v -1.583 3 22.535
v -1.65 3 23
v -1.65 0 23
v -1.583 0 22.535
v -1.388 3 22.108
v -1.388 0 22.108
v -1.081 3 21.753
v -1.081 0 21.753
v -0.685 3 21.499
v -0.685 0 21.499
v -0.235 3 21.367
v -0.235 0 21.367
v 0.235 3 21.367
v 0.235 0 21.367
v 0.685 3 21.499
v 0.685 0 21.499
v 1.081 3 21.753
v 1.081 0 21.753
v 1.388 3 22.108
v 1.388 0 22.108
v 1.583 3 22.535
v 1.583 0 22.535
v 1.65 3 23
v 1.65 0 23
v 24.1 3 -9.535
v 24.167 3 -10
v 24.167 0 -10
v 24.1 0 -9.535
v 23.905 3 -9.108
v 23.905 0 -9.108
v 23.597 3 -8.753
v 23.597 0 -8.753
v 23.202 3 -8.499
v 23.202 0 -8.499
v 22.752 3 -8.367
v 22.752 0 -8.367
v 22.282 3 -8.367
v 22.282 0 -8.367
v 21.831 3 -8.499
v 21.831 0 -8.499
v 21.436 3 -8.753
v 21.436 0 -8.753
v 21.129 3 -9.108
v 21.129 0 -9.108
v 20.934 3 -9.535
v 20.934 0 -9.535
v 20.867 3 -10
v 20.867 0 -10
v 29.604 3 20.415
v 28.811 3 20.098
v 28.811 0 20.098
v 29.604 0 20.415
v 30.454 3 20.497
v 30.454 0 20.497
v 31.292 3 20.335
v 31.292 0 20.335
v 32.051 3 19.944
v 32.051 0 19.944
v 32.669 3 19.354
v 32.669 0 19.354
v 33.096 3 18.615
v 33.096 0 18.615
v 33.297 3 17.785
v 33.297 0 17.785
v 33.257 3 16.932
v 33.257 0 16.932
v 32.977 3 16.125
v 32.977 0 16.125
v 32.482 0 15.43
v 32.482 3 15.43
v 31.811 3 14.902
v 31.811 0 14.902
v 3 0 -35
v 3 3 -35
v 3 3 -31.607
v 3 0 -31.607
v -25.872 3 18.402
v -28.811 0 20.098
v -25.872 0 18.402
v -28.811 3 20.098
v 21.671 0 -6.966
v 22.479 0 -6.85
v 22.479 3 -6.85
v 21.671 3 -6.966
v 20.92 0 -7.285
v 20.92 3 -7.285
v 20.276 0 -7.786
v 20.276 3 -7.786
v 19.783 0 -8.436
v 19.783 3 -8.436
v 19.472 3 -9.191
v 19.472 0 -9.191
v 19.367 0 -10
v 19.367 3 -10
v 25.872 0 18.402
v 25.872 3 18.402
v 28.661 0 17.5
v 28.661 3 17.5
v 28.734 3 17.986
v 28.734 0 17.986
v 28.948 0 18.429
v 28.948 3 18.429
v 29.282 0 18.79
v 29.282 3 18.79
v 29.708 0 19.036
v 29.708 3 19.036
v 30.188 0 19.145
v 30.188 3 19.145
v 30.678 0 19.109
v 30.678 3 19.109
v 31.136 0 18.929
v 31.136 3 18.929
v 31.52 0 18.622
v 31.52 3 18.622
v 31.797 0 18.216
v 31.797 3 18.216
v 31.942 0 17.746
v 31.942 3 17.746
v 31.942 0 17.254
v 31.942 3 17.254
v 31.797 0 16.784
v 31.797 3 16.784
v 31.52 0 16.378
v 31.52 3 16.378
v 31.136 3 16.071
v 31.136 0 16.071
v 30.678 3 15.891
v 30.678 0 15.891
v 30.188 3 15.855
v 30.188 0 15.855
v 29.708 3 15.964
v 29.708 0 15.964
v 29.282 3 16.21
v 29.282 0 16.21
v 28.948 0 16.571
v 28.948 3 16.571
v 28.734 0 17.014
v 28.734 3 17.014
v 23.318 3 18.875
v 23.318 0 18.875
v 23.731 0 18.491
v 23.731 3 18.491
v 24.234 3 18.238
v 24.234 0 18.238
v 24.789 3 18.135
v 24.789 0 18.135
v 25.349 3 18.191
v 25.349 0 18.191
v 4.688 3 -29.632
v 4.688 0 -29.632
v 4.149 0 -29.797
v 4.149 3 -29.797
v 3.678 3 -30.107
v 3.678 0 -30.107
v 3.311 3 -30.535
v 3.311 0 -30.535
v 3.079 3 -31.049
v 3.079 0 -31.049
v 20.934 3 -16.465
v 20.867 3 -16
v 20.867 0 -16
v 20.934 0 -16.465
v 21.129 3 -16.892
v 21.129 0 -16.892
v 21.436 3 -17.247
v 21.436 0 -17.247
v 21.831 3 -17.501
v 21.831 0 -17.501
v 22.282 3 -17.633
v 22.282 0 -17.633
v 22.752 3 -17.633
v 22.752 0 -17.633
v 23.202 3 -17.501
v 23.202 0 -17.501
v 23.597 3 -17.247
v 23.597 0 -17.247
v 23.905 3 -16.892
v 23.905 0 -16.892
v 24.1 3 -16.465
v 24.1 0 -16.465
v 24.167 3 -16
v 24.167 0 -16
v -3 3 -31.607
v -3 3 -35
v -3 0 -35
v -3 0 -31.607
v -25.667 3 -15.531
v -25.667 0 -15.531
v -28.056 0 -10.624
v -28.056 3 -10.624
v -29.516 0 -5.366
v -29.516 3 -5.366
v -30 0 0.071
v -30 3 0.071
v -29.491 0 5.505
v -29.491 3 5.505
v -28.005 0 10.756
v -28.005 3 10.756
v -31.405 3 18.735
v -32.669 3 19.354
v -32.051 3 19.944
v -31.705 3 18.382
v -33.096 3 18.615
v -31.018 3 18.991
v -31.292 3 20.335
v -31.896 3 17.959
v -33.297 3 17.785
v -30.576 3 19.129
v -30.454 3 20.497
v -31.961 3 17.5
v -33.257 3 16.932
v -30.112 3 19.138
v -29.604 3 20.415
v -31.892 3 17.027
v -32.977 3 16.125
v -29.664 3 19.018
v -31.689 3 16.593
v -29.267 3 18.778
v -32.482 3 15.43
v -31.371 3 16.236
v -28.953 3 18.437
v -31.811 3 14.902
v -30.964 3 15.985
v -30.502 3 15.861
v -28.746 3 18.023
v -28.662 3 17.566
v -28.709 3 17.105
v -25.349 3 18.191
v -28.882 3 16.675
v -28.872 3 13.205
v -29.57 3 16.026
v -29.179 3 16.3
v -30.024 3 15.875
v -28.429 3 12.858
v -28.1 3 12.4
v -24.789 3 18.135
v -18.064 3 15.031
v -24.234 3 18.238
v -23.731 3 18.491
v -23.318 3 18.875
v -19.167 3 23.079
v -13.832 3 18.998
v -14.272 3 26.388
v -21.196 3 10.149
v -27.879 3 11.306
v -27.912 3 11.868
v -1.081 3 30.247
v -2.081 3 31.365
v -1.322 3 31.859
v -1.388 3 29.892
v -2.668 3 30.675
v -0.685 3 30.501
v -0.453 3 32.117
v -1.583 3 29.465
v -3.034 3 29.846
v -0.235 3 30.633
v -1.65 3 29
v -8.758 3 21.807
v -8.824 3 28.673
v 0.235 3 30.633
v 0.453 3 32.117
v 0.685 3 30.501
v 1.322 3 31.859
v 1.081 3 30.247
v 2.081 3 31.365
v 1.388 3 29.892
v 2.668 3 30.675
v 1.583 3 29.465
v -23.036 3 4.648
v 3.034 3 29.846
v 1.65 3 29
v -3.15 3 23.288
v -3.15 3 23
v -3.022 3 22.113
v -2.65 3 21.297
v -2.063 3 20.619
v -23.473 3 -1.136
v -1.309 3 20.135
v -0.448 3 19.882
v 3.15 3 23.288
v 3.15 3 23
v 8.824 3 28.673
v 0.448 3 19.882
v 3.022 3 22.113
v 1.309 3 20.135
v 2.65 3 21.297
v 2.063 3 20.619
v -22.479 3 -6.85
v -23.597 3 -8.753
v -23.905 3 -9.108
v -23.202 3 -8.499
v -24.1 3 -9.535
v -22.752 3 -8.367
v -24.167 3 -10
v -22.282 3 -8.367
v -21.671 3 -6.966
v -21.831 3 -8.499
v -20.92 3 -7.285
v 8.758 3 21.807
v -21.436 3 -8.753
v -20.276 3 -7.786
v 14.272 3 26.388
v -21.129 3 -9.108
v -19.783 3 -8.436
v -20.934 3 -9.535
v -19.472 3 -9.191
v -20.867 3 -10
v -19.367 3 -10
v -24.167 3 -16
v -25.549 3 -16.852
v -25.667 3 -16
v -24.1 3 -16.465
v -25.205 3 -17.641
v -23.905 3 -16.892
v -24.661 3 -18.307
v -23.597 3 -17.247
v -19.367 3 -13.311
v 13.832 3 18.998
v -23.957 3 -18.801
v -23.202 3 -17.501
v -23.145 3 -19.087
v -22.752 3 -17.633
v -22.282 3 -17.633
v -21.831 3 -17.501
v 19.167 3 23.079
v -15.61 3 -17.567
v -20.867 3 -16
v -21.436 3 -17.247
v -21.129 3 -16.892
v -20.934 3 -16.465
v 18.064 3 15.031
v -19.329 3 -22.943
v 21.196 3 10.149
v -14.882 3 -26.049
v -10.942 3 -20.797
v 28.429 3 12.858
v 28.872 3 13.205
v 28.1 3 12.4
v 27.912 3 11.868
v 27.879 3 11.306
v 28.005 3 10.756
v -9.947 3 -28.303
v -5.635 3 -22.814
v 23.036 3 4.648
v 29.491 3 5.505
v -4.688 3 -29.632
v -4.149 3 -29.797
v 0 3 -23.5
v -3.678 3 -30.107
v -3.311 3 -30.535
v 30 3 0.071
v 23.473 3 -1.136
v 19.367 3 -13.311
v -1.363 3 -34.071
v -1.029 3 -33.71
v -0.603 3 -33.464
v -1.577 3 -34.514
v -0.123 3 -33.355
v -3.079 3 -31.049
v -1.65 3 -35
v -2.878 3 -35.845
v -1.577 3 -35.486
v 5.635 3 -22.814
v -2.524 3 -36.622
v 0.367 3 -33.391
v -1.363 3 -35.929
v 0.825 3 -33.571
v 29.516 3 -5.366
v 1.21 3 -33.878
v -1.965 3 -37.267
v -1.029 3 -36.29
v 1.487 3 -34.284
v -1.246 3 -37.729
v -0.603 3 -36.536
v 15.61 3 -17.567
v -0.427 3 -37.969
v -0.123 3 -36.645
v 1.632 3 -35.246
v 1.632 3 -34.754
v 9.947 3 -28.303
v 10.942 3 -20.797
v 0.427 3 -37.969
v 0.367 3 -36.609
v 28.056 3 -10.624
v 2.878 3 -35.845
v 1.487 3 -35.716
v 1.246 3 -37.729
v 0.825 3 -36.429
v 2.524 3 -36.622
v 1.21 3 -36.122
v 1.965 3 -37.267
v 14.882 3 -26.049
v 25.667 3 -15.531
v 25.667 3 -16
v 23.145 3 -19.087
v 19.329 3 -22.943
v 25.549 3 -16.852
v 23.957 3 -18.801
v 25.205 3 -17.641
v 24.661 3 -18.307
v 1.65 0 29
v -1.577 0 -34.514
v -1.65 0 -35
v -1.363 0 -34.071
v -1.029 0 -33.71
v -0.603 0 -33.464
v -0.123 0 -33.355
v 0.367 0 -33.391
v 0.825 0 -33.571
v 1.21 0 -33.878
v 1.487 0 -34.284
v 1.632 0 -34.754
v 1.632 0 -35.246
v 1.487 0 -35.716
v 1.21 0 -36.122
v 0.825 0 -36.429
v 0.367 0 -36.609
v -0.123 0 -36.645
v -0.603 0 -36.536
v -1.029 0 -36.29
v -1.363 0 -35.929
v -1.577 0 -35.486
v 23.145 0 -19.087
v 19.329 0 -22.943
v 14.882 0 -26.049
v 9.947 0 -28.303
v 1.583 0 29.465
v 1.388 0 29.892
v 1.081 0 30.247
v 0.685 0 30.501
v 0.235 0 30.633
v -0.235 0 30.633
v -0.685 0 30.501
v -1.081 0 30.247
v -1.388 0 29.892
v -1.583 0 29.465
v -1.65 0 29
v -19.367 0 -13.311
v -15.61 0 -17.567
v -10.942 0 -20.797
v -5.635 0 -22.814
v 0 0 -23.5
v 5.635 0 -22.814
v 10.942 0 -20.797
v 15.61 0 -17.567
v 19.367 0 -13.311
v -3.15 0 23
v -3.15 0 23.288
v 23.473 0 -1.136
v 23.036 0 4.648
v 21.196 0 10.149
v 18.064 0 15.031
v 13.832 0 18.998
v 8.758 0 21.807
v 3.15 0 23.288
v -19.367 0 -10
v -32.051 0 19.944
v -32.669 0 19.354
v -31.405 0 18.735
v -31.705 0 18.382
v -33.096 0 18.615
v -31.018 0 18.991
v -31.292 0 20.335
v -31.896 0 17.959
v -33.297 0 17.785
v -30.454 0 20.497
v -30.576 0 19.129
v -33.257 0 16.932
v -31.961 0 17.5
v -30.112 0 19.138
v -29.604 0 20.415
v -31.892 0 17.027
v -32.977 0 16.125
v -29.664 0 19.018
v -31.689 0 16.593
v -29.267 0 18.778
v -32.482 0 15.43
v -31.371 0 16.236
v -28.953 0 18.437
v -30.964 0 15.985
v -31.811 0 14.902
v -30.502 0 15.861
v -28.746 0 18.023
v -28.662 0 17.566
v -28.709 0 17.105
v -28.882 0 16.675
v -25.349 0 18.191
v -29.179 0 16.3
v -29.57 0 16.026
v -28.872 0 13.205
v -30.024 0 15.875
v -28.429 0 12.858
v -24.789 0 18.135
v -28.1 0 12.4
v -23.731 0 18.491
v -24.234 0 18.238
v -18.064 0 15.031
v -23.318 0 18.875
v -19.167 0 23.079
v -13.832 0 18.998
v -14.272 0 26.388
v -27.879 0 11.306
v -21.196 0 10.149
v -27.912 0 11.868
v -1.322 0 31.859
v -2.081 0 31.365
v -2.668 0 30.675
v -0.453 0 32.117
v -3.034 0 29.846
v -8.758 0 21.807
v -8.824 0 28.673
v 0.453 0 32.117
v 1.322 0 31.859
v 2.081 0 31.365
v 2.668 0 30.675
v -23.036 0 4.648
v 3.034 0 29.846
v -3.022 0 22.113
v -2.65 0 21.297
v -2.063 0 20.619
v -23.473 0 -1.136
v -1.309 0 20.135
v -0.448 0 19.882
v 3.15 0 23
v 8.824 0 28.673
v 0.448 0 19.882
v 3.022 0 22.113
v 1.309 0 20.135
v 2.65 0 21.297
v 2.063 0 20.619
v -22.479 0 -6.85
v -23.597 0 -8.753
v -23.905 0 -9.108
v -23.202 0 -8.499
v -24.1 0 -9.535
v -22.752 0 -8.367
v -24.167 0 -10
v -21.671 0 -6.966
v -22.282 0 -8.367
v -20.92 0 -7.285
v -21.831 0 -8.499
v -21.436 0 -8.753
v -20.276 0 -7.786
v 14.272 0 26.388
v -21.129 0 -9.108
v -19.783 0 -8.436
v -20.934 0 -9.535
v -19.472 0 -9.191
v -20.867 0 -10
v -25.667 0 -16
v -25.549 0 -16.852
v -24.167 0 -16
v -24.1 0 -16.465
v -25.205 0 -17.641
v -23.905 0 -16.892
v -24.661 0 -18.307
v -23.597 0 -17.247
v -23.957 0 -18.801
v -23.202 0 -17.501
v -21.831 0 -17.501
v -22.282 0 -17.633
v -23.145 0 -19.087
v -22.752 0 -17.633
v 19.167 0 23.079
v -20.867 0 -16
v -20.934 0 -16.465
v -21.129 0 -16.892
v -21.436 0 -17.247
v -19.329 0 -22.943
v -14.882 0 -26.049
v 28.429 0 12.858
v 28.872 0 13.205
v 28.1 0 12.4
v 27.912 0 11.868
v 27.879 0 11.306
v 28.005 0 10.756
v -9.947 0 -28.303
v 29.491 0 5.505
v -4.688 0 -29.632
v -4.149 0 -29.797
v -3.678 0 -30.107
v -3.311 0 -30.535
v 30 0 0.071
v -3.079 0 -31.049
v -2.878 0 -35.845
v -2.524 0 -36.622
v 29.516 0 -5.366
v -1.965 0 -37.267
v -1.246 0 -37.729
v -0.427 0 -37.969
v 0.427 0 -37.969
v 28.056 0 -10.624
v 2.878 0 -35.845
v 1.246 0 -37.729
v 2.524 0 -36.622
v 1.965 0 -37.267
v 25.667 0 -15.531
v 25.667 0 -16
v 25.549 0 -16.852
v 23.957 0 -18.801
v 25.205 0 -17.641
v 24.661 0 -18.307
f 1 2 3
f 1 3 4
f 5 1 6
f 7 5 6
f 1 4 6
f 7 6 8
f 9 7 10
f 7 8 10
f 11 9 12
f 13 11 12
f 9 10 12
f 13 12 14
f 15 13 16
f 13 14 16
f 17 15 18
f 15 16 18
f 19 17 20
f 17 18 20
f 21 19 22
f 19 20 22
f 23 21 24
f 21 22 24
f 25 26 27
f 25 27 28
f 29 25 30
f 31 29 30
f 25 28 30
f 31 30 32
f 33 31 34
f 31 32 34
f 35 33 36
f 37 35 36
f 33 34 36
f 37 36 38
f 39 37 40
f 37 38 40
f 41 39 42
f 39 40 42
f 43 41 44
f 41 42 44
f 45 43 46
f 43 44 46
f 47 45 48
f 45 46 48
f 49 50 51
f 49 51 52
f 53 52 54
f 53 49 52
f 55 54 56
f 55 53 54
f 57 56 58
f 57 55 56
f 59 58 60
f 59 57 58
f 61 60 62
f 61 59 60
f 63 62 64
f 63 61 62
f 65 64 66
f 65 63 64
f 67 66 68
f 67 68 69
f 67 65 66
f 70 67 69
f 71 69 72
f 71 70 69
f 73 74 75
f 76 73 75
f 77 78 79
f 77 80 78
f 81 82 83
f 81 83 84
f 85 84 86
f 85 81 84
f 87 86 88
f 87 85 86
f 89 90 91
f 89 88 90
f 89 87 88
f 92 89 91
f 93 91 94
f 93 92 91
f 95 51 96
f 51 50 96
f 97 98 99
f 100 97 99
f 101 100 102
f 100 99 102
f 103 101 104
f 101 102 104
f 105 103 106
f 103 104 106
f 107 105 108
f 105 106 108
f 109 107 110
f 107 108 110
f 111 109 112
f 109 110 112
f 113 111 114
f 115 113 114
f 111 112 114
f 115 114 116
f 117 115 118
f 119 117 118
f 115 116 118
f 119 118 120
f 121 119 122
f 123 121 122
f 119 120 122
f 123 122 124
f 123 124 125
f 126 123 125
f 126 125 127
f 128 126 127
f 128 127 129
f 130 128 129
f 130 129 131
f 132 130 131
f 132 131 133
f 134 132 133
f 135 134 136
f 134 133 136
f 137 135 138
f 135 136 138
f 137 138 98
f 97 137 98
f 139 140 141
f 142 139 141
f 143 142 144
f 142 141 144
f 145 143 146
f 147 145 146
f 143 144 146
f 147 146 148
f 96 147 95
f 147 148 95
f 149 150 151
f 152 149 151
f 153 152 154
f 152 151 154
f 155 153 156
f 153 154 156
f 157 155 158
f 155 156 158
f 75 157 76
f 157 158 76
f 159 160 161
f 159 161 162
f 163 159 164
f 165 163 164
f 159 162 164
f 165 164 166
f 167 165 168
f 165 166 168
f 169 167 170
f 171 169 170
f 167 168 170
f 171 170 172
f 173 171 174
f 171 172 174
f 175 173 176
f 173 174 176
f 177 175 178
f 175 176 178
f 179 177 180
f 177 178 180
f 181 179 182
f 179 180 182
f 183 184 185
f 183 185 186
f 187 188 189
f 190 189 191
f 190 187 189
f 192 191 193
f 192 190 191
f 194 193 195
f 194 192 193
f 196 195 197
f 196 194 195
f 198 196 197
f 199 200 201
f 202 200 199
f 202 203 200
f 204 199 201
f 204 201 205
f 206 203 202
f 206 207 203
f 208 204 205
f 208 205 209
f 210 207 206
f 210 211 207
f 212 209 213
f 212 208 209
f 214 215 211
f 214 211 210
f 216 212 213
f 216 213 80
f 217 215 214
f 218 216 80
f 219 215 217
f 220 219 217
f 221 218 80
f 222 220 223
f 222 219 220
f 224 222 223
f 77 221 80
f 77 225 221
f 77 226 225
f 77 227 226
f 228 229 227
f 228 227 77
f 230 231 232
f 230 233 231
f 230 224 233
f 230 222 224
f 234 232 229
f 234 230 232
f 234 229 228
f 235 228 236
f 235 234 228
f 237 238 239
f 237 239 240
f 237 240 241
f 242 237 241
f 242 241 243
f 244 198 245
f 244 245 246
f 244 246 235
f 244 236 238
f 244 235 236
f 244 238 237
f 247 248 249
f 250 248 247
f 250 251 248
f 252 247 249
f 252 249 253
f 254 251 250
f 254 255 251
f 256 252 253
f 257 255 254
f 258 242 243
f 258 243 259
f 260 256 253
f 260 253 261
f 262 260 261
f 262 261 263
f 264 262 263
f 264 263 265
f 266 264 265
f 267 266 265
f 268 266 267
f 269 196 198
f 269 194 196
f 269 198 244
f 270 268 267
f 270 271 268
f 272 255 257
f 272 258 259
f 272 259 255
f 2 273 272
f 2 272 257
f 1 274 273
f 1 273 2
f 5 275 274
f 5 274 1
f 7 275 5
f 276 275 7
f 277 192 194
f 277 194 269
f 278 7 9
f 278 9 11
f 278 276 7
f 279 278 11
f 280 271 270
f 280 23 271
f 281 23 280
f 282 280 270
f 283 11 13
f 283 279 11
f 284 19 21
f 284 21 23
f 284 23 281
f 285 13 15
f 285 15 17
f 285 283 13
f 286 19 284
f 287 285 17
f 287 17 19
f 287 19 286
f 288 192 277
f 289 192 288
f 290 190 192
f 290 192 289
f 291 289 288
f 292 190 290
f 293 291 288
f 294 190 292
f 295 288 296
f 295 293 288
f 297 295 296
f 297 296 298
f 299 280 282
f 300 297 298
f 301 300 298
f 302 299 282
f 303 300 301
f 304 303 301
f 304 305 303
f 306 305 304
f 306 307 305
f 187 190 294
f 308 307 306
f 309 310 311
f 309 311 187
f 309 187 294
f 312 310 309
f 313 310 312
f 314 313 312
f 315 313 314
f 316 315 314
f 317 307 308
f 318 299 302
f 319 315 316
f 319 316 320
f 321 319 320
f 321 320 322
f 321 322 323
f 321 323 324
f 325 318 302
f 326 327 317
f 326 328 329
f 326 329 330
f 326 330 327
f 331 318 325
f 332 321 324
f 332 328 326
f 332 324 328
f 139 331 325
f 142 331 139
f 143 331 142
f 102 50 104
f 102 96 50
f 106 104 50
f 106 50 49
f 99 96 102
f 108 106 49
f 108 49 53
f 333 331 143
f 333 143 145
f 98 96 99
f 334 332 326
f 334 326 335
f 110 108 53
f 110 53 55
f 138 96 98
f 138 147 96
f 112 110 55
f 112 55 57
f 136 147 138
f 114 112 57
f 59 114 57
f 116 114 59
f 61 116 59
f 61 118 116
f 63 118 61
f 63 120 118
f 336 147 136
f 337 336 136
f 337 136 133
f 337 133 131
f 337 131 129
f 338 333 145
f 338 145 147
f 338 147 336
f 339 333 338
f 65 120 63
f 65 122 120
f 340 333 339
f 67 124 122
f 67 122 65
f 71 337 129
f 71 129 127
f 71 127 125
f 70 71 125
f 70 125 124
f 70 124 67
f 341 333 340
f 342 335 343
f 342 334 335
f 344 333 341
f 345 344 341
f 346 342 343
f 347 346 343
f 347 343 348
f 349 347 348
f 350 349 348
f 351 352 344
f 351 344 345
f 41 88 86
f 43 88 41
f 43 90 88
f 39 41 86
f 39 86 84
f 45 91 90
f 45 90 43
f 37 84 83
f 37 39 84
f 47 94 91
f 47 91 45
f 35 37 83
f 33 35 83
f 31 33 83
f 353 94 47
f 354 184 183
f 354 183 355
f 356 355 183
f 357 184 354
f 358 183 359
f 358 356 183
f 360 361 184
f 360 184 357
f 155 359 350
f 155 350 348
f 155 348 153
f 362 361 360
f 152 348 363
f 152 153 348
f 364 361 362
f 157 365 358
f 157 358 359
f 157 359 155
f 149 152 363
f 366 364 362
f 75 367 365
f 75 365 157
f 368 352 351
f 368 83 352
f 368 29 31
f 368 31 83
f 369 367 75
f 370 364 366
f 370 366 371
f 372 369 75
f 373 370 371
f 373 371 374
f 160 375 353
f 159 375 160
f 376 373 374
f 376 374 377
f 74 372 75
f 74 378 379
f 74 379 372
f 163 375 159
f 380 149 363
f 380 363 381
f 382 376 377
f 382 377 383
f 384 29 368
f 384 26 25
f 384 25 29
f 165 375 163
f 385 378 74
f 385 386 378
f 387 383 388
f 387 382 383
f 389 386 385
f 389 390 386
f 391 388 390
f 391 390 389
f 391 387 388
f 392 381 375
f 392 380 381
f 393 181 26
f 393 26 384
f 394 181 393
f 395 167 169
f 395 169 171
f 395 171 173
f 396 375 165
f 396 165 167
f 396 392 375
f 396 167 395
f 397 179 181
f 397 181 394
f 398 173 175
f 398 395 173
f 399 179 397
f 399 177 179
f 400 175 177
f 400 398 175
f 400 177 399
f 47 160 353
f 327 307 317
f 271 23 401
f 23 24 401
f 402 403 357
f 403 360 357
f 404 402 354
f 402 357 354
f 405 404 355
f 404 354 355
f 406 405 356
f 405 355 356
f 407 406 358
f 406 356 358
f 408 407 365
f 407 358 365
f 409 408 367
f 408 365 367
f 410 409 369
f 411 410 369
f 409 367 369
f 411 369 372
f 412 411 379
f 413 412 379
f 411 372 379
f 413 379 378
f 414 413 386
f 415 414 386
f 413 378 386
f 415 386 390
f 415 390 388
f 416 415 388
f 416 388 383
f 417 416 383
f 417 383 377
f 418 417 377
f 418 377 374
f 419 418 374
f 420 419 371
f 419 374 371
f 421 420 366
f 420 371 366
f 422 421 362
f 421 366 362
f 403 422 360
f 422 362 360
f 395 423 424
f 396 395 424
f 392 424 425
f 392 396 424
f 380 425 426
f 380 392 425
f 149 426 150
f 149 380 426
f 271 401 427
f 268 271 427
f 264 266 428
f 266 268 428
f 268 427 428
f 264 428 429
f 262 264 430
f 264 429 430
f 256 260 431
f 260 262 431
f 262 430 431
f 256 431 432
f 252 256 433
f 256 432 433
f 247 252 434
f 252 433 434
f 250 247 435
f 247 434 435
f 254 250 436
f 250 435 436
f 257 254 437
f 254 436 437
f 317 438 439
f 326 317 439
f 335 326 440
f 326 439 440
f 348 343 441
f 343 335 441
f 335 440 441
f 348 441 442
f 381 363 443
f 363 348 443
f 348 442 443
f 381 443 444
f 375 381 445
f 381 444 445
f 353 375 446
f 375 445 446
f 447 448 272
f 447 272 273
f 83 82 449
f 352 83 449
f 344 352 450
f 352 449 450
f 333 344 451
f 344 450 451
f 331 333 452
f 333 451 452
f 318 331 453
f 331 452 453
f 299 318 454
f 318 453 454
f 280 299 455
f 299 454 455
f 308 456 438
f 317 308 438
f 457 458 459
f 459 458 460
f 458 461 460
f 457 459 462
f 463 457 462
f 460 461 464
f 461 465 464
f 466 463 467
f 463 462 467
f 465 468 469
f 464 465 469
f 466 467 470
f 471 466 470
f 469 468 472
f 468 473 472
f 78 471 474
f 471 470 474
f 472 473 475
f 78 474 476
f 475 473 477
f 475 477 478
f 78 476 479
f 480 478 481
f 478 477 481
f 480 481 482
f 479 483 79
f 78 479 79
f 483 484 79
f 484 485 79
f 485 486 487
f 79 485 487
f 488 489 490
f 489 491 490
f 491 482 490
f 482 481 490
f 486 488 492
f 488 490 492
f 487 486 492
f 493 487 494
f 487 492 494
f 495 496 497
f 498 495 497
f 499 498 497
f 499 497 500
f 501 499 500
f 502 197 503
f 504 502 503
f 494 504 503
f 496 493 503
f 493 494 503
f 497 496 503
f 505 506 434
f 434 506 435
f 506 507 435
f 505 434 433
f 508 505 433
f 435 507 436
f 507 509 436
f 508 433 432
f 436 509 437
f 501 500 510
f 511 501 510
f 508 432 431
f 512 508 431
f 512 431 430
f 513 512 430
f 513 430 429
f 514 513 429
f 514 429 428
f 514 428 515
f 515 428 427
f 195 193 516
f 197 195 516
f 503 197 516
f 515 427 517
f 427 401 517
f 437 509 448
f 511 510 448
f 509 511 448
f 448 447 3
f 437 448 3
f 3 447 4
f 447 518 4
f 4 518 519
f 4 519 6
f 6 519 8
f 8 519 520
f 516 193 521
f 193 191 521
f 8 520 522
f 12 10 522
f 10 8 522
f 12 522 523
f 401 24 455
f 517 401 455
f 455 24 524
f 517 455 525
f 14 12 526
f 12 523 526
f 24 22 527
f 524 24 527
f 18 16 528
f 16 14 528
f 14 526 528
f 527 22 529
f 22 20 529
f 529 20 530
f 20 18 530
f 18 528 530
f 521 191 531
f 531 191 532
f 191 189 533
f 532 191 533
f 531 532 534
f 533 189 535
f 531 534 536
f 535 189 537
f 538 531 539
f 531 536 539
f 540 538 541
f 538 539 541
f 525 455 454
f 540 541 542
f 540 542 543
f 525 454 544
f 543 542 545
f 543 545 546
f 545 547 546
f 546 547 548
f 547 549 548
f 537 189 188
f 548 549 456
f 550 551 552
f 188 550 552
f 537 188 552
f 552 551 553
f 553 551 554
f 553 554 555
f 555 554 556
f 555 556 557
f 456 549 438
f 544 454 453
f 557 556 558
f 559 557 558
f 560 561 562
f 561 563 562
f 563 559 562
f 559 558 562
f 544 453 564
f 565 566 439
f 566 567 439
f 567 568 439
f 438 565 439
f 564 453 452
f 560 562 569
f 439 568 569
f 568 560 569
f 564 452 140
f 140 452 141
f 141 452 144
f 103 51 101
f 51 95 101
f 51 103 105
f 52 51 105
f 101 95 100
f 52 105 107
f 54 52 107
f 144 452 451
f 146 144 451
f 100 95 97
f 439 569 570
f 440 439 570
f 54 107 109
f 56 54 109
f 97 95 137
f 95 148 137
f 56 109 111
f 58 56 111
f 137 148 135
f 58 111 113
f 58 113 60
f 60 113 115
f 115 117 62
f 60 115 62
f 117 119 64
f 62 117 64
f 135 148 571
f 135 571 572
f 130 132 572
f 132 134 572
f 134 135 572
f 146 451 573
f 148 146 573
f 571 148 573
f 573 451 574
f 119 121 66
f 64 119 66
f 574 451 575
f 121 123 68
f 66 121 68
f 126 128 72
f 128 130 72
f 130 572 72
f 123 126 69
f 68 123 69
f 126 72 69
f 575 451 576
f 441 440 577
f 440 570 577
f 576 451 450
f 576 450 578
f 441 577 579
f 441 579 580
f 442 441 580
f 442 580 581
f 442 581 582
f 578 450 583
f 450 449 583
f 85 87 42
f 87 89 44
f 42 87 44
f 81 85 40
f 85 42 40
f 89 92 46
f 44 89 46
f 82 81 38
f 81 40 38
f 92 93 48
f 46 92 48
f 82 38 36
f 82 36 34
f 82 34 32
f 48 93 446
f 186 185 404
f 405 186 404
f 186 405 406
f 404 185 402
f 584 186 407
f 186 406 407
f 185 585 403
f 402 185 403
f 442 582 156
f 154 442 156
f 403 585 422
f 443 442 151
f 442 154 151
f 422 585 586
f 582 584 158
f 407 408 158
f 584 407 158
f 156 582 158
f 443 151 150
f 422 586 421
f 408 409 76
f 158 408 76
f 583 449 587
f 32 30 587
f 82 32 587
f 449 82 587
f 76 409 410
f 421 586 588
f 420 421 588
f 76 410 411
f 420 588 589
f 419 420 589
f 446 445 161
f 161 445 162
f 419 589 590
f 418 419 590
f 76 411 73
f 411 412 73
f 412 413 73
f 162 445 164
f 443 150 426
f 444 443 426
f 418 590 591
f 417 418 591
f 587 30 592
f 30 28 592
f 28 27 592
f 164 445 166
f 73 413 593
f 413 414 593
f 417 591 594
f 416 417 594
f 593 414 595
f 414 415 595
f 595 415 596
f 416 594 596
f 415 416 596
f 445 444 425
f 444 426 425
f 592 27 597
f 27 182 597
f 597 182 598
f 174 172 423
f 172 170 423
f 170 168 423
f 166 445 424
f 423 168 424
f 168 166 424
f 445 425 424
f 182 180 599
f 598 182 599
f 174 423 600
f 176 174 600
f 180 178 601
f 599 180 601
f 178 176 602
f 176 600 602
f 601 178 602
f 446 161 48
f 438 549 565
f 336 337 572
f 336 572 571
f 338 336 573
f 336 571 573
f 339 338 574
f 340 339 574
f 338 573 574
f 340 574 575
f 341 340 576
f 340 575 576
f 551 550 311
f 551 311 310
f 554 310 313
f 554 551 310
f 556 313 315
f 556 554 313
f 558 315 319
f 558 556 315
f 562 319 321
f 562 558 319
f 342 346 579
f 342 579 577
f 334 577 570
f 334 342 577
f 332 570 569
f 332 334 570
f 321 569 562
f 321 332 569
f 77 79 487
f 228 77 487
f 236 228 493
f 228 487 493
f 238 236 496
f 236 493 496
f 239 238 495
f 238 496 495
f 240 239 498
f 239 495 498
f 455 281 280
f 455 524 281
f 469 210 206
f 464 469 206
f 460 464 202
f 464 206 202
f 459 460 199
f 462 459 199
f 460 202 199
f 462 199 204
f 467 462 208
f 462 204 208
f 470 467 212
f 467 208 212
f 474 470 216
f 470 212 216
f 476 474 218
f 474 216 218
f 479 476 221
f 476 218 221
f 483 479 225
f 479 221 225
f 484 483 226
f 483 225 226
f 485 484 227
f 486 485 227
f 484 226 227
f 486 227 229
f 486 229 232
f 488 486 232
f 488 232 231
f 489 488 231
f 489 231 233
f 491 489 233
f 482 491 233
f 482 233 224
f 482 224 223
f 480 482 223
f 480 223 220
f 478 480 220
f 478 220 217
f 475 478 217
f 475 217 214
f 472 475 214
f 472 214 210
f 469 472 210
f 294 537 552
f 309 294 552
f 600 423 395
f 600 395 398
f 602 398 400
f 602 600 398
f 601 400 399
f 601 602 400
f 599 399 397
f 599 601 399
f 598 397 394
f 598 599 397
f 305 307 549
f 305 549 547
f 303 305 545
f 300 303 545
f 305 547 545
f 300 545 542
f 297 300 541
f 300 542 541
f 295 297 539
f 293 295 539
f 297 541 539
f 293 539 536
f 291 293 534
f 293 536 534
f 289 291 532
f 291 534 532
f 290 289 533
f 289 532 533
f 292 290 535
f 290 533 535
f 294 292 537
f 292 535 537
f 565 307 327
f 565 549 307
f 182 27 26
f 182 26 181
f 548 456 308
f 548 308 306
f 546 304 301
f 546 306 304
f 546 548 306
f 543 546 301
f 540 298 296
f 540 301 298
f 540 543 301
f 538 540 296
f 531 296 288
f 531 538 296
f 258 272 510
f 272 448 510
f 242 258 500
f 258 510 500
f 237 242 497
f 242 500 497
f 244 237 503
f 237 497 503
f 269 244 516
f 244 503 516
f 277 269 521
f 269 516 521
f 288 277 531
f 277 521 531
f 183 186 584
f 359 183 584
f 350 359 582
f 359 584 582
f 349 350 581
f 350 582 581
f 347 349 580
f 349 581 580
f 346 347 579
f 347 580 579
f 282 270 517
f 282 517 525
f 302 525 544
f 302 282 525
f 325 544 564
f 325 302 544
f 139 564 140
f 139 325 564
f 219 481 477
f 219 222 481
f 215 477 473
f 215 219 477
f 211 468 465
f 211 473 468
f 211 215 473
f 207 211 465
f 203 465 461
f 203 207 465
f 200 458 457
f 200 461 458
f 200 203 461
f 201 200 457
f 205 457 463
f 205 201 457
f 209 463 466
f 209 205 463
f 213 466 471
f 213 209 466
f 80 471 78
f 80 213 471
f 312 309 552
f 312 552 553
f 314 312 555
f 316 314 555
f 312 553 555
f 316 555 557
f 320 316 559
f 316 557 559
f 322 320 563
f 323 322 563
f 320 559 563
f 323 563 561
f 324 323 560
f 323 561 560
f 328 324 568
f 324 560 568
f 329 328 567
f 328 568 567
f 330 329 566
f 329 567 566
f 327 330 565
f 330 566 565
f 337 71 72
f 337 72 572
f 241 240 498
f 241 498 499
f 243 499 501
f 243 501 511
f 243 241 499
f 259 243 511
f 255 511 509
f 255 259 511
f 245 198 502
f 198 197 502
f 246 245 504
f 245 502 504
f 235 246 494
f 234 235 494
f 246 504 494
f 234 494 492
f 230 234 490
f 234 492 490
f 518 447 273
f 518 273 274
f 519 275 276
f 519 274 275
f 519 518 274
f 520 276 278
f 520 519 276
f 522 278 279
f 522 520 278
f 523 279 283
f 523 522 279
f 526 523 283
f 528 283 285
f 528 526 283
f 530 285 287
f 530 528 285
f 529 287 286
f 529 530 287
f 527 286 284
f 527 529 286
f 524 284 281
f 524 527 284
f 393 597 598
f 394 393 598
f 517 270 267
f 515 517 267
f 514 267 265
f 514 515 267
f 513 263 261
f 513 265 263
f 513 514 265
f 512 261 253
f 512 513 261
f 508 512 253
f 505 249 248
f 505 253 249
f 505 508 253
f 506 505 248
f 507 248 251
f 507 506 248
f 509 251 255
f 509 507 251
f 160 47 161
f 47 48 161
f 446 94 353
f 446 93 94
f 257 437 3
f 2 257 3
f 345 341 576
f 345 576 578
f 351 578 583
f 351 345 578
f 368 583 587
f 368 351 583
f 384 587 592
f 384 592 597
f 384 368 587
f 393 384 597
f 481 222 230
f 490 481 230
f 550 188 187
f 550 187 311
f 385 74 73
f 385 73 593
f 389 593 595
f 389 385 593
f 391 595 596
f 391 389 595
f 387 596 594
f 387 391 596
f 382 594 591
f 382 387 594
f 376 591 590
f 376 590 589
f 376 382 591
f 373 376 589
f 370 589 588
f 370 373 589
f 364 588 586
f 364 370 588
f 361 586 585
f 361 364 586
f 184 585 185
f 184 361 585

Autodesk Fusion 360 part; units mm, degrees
sketch "Sketch1" plane through (0, 0, 0) normal (0, 1, 0) x (1, 0, 0)
  circle A0 centre (0, 0) radius 26
  line L0 (0, 0) -> (22.5167, 13)
  line L1 (0, 0) -> (26, 0) construction
  line L2 (0, 0) -> (-22.5167, 13)
  line L3 (0, 0) -> (26, 0) construction
  line L4 (0, 0) -> (0, -26)
  circle A1 centre (0, 0) radius 23.5
  circle A2 centre (0, 0) radius 28.5
  line L5 (-22.5167, 13) -> (-22.5167, 16)
  line L6 (-22.5167, 13) -> (-22.5167, 10)
  line L7 (-24.1667, 10) -> (-24.1667, 16)
  line L8 (-20.8667, 10) -> (-20.8667, 16)
  line L9 (0, -26) -> (0, -23)
  line L10 (0, -26) -> (0, -29)
  line L11 (0, -26) -> (0, -23)
  line L12 (0, -29) -> (-1.65, -29)
  line L13 (-1.65, -29) -> (-1.65, -23)
  line L14 (1.65, -23) -> (1.65, -29)
  line L15 (24.1667, 10) -> (24.1667, 16)
  line L16 (20.8667, 10) -> (20.8667, 16)
  arc A3 (-1.65, -29) -> (1.65, -29) centre (0, -29) ccw
  arc A4 (1.65, -23) -> (-1.65, -23) centre (0, -23) ccw
  arc A5 (20.8667, 10) -> (24.1667, 10) centre (22.5167, 10) ccw
  arc A6 (24.1667, 16) -> (20.8667, 16) centre (22.5167, 16) ccw
  arc A7 (-24.1667, 10) -> (-20.8667, 10) centre (-22.5167, 10) ccw
  arc A8 (-20.8667, 16) -> (-24.1667, 16) centre (-22.5167, 16) ccw
  line L17 (-25.6667, 10) -> (-25.6667, 16)
  arc A9 (-19.3667, 16) -> (-25.6667, 16) centre (-22.5167, 16) ccw
  line L18 (-19.3667, 10) -> (-19.3667, 16)
  arc A10 (-25.6667, 10) -> (-19.3667, 10) centre (-22.5167, 10) ccw
  line L19 (-3.15, -29) -> (-3.15, -23)
  arc A11 (3.15, -23) -> (-3.15, -23) centre (0, -23) ccw
  line L20 (3.15, -23) -> (3.15, -29)
  arc A12 (-3.15, -29) -> (3.15, -29) centre (0, -29) ccw
  line L21 (19.3667, 10) -> (19.3667, 16)
  arc A13 (25.6667, 16) -> (19.3667, 16) centre (22.5167, 16) ccw
  line L22 (25.6667, 10) -> (25.6667, 16)
  arc A14 (19.3667, 10) -> (25.6667, 10) centre (22.5167, 10) ccw
  dimension "d1" = 52
  dimension "d2" = 30
  dimension "d3" = 150
  dimension "d7" = 47
  dimension "d8" = 57
  dimension "d9" = 3
  dimension "d11" = 3.3
  dimension "d12" = 3
  dimension "d13" = 3
  dimension "d14" = 3.3
  dimension "d15" = 3.3
  dimension "d23" = 1.5
  dimension "d24" = 1.5
  dimension "d25" = 1.5
extrude "Extrude2" add sketch "Sketch1" along normal blind 3 contours A0 A1 L20 A14 | A0 A2 L20 L22 A14 | A0 A1 A5 A14 | A0 A2 L15 A5 L22 A14 | A0 A2 L14 L20 | A0 A1 L14 L20 | L0 A1 L16 A5 L21 A14 | L4 A1 L14 A4 A11 L20 | A2 L13 L14 A3 L19 L20 A12 | A2 L15 A6 A13 L22 | A0 L0 A1 L16 L21 A13 | A0 A2 L16 A6 A13 | L0 A1 L16 | L0 A1 L21 | A0 A2 L13 L19 | A0 A1 L13 L19 | L4 A1 L13 A4 L19 A11 | A0 A1 A9 L18 L21 A13 | A0 A2 A9 A13 | A0 A2 L17 A10 L19 | A0 A1 A10 L19 | A0 L2 A1 L8 A9 L18 | A0 A2 L8 A8 A9 | L2 A1 L8 A7 L18 A10 | L2 A1 L18 | A2 L7 A8 L17 A9 | A0 A2 L7 A7 L17 A10 | A0 A1 A7 A10 | L2 A1 L8
sketch "Sketch2" plane through (0, 3, 0) normal (0, 1, 0) x (-1, 0, 0)
  arc A0 (-20.8667, -10) -> (-24.1667, -10) centre (-22.5167, -10) ccw
  line L0 (-20.8667, -10) -> (-20.8667, -16)
  arc A1 (-24.1667, -16) -> (-20.8667, -16) centre (-22.5167, -16) ccw
  line L1 (-24.1667, -16) -> (-24.1667, -10)
  arc A2 (24.1667, -10) -> (20.8667, -10) centre (22.5167, -10) ccw
  line L2 (24.1667, -10) -> (24.1667, -16)
  arc A3 (20.8667, -16) -> (24.1667, -16) centre (22.5167, -16) ccw
  line L3 (20.8667, -16) -> (20.8667, -10)
  arc A4 (1.65, 29) -> (-1.65, 29) centre (0, 29) ccw
  line L4 (1.65, 29) -> (1.65, 23)
  arc A5 (-1.65, 23) -> (1.65, 23) centre (0, 23) ccw
  line L5 (-1.65, 23) -> (-1.65, 29)
  arc A6 (-19.3667, -13.311) -> (19.3667, -13.311) centre (0, 0) ccw
  line L6 (-19.3667, -13.311) -> (-19.3667, -10)
  arc A7 (-19.3667, -10) -> (-22.4794, -6.8502) centre (-22.5167, -10) ccw
  arc A8 (-3.15, 23.2879) -> (-22.4794, -6.8502) centre (0, 0) ccw
  line L7 (-3.15, 23.2879) -> (-3.15, 23)
  arc A9 (-3.15, 23) -> (3.15, 23) centre (0, 23) ccw
  line L8 (3.15, 23) -> (3.15, 23.2879)
  arc A10 (22.4794, -6.8502) -> (3.15, 23.2879) centre (0, 0) ccw
  arc A11 (22.4794, -6.8502) -> (19.3667, -10) centre (22.5167, -10) ccw
  line L9 (19.3667, -10) -> (19.3667, -13.311)
  arc A12 (3.15, 29) -> (-3.15, 29) centre (0, 29) ccw
  line L10 (-3.15, 29) -> (-3.15, 28.3254)
  arc A13 (-3.15, 28.3254) -> (-25.6667, -12.3884) centre (0, 0) ccw
  line L11 (-25.6667, -12.3884) -> (-25.6667, -16)
  arc A14 (-25.6667, -16) -> (-21.3196, -18.9137) centre (-22.5167, -16) ccw
  arc A15 (-21.3196, -18.9137) -> (21.3196, -18.9137) centre (0, 0) ccw
  arc A16 (21.3196, -18.9137) -> (25.6667, -16) centre (22.5167, -16) ccw
  line L12 (25.6667, -16) -> (25.6667, -12.3884)
  arc A17 (25.6667, -12.3884) -> (3.15, 28.3254) centre (0, 0) ccw
  line L13 (3.15, 28.3254) -> (3.15, 29)
  circle A18 centre (0, 0) radius 23.75
  circle A19 centre (0, 0) radius 30
  circle A20 centre (0, 0) radius 25 construction
  circle A21 centre (0, 0) radius 27.5 construction
  line L14 (0, 0) -> (0, -35)
  line L15 (0, 0) -> (-30.3109, 17.5)
  line L16 (0, 0) -> (35, 0) construction
  line L17 (0, 0) -> (30.3109, 17.5)
  line L18 (0, 0) -> (35, 0) construction
  circle A22 centre (30.3109, 17.5) radius 1.65
  circle A23 centre (-30.3109, 17.5) radius 1.65
  circle A24 centre (0, -35) radius 1.65
  circle A25 centre (0, -35) radius 3
  circle A26 centre (30.3109, 17.5) radius 3
  circle A27 centre (-30.3109, 17.5) radius 3
  line L19 (-30.3109, 17.5) -> (-31.8109, 14.9019)
  line L20 (-31.8109, 14.9019) -> (-27.3505, 12.3267)
  line L21 (-30.3109, 17.5) -> (-28.8109, 20.0981)
  line L22 (-28.8109, 20.0981) -> (-24.3505, 17.5229)
  line L23 (31.8109, 14.9019) -> (27.3505, 12.3267)
  line L24 (28.8109, 20.0981) -> (24.3505, 17.5229)
  line L25 (3, -35) -> (3, -29.8496)
  line L26 (0, -35) -> (3, -35)
  line L27 (0, -35) -> (-3, -35)
  line L28 (-3, -35) -> (-3, -29.8496)
  dimension "d28" = 47.5
  dimension "d29" = 60
  dimension "d32" = 50
  dimension "d33" = 55
  dimension "d39" = 35
  dimension "d40" = 150
  dimension "d41" = 35
  dimension "d42" = 35
  dimension "d43" = 30
  dimension "d44" = 3.3
  dimension "d45" = 3.3
  dimension "d46" = 3.3
  dimension "d47" = 6
  dimension "d48" = 6
  dimension "d49" = 6
extrude "Extrude3" add sketch "Sketch2" against normal blind 3 contours A12 L10 A13 A19 L15 | A13 L11 A19 L15 | A14 A15 A19 L14 | A15 A16 A19 L14 | A19 L15 A27 L22 | A19 L15 A27 L20 | A19 L14 A25 L28 | A19 L14 A25 L25 | L15 A23 A27 L19 | L15 A23 A27 L21 | L14 A24 A25 L26 | L14 A24 A25 L27 | L12 A17 A19 L17 | A12 A17 L13 A19 L17 | A23 A27 L19 L21 | A24 A25 L26 L27 | A19 L17 A26 L23 | A19 L17 A26 L24 | A26
fillet "Fillet1" radius 2 6 edges at (-24.3505, 1.5, 17.5229) (-27.3505, 1.5, 12.3267) (-3, 1.5, -29.8496) (3, 1.5, -29.8496) (27.3505, 1.5, 12.3267) (24.3505, 1.5, 17.5229)
equation "d1 = ( 26 * 2 ) * 1 mm"
equation "d8 = 52 mm + 5 mm"
